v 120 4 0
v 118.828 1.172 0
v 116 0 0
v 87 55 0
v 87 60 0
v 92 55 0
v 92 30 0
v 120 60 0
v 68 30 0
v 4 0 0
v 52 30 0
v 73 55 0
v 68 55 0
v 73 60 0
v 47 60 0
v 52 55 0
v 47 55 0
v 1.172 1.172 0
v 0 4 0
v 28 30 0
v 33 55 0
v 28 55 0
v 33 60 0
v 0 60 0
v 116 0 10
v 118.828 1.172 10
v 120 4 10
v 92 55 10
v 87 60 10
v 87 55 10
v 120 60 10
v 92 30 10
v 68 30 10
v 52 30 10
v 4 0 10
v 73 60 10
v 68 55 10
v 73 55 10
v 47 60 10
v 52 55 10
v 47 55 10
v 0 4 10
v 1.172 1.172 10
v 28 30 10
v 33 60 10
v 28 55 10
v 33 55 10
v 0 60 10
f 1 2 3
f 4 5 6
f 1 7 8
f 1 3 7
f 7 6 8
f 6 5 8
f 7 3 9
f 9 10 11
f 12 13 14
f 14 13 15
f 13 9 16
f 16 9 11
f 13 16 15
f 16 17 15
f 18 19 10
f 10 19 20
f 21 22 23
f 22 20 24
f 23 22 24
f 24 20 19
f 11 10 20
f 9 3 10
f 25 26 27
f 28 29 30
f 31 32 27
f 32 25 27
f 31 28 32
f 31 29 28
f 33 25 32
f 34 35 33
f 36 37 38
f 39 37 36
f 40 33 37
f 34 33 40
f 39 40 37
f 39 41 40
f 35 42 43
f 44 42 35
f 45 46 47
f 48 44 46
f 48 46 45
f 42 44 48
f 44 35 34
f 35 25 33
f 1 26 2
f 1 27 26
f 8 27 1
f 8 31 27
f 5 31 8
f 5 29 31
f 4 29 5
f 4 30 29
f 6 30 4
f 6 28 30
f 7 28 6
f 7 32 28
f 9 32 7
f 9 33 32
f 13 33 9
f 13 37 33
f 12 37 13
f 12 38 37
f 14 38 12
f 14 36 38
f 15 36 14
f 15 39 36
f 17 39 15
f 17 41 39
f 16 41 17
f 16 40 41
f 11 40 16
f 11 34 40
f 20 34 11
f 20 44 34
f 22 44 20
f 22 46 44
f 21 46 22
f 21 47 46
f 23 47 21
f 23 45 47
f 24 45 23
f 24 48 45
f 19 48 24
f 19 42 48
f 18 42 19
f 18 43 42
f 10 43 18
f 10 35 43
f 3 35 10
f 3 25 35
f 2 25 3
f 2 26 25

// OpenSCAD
$fn = 32;

// ----------------------------------------------------------------------
// Oversize slot bar: 120 mm bar with 2 oversize windows
// ----------------------------------------------------------------------

// --- parameters (mm) ---
profile_height = 10;      // extrusion height
profile_points = 24;      // points of the closed outline

profile = [[0, 4], [1.172, 1.172], [4, 0], [116, 0], [118.828, 1.172], [120, 4], [120, 60], [87, 60], [87, 55], [92, 55], [92, 30], [68, 30], [68, 55], [73, 55], [73, 60], [47, 60], [47, 55], [52, 55], [52, 30], [28, 30], [28, 55], [33, 55], [33, 60], [0, 60]];  // single closed polygon, 24 points, counter clockwise

// --- the one profile operation ---
linear_extrude(height = profile_height) polygon(points = profile);
